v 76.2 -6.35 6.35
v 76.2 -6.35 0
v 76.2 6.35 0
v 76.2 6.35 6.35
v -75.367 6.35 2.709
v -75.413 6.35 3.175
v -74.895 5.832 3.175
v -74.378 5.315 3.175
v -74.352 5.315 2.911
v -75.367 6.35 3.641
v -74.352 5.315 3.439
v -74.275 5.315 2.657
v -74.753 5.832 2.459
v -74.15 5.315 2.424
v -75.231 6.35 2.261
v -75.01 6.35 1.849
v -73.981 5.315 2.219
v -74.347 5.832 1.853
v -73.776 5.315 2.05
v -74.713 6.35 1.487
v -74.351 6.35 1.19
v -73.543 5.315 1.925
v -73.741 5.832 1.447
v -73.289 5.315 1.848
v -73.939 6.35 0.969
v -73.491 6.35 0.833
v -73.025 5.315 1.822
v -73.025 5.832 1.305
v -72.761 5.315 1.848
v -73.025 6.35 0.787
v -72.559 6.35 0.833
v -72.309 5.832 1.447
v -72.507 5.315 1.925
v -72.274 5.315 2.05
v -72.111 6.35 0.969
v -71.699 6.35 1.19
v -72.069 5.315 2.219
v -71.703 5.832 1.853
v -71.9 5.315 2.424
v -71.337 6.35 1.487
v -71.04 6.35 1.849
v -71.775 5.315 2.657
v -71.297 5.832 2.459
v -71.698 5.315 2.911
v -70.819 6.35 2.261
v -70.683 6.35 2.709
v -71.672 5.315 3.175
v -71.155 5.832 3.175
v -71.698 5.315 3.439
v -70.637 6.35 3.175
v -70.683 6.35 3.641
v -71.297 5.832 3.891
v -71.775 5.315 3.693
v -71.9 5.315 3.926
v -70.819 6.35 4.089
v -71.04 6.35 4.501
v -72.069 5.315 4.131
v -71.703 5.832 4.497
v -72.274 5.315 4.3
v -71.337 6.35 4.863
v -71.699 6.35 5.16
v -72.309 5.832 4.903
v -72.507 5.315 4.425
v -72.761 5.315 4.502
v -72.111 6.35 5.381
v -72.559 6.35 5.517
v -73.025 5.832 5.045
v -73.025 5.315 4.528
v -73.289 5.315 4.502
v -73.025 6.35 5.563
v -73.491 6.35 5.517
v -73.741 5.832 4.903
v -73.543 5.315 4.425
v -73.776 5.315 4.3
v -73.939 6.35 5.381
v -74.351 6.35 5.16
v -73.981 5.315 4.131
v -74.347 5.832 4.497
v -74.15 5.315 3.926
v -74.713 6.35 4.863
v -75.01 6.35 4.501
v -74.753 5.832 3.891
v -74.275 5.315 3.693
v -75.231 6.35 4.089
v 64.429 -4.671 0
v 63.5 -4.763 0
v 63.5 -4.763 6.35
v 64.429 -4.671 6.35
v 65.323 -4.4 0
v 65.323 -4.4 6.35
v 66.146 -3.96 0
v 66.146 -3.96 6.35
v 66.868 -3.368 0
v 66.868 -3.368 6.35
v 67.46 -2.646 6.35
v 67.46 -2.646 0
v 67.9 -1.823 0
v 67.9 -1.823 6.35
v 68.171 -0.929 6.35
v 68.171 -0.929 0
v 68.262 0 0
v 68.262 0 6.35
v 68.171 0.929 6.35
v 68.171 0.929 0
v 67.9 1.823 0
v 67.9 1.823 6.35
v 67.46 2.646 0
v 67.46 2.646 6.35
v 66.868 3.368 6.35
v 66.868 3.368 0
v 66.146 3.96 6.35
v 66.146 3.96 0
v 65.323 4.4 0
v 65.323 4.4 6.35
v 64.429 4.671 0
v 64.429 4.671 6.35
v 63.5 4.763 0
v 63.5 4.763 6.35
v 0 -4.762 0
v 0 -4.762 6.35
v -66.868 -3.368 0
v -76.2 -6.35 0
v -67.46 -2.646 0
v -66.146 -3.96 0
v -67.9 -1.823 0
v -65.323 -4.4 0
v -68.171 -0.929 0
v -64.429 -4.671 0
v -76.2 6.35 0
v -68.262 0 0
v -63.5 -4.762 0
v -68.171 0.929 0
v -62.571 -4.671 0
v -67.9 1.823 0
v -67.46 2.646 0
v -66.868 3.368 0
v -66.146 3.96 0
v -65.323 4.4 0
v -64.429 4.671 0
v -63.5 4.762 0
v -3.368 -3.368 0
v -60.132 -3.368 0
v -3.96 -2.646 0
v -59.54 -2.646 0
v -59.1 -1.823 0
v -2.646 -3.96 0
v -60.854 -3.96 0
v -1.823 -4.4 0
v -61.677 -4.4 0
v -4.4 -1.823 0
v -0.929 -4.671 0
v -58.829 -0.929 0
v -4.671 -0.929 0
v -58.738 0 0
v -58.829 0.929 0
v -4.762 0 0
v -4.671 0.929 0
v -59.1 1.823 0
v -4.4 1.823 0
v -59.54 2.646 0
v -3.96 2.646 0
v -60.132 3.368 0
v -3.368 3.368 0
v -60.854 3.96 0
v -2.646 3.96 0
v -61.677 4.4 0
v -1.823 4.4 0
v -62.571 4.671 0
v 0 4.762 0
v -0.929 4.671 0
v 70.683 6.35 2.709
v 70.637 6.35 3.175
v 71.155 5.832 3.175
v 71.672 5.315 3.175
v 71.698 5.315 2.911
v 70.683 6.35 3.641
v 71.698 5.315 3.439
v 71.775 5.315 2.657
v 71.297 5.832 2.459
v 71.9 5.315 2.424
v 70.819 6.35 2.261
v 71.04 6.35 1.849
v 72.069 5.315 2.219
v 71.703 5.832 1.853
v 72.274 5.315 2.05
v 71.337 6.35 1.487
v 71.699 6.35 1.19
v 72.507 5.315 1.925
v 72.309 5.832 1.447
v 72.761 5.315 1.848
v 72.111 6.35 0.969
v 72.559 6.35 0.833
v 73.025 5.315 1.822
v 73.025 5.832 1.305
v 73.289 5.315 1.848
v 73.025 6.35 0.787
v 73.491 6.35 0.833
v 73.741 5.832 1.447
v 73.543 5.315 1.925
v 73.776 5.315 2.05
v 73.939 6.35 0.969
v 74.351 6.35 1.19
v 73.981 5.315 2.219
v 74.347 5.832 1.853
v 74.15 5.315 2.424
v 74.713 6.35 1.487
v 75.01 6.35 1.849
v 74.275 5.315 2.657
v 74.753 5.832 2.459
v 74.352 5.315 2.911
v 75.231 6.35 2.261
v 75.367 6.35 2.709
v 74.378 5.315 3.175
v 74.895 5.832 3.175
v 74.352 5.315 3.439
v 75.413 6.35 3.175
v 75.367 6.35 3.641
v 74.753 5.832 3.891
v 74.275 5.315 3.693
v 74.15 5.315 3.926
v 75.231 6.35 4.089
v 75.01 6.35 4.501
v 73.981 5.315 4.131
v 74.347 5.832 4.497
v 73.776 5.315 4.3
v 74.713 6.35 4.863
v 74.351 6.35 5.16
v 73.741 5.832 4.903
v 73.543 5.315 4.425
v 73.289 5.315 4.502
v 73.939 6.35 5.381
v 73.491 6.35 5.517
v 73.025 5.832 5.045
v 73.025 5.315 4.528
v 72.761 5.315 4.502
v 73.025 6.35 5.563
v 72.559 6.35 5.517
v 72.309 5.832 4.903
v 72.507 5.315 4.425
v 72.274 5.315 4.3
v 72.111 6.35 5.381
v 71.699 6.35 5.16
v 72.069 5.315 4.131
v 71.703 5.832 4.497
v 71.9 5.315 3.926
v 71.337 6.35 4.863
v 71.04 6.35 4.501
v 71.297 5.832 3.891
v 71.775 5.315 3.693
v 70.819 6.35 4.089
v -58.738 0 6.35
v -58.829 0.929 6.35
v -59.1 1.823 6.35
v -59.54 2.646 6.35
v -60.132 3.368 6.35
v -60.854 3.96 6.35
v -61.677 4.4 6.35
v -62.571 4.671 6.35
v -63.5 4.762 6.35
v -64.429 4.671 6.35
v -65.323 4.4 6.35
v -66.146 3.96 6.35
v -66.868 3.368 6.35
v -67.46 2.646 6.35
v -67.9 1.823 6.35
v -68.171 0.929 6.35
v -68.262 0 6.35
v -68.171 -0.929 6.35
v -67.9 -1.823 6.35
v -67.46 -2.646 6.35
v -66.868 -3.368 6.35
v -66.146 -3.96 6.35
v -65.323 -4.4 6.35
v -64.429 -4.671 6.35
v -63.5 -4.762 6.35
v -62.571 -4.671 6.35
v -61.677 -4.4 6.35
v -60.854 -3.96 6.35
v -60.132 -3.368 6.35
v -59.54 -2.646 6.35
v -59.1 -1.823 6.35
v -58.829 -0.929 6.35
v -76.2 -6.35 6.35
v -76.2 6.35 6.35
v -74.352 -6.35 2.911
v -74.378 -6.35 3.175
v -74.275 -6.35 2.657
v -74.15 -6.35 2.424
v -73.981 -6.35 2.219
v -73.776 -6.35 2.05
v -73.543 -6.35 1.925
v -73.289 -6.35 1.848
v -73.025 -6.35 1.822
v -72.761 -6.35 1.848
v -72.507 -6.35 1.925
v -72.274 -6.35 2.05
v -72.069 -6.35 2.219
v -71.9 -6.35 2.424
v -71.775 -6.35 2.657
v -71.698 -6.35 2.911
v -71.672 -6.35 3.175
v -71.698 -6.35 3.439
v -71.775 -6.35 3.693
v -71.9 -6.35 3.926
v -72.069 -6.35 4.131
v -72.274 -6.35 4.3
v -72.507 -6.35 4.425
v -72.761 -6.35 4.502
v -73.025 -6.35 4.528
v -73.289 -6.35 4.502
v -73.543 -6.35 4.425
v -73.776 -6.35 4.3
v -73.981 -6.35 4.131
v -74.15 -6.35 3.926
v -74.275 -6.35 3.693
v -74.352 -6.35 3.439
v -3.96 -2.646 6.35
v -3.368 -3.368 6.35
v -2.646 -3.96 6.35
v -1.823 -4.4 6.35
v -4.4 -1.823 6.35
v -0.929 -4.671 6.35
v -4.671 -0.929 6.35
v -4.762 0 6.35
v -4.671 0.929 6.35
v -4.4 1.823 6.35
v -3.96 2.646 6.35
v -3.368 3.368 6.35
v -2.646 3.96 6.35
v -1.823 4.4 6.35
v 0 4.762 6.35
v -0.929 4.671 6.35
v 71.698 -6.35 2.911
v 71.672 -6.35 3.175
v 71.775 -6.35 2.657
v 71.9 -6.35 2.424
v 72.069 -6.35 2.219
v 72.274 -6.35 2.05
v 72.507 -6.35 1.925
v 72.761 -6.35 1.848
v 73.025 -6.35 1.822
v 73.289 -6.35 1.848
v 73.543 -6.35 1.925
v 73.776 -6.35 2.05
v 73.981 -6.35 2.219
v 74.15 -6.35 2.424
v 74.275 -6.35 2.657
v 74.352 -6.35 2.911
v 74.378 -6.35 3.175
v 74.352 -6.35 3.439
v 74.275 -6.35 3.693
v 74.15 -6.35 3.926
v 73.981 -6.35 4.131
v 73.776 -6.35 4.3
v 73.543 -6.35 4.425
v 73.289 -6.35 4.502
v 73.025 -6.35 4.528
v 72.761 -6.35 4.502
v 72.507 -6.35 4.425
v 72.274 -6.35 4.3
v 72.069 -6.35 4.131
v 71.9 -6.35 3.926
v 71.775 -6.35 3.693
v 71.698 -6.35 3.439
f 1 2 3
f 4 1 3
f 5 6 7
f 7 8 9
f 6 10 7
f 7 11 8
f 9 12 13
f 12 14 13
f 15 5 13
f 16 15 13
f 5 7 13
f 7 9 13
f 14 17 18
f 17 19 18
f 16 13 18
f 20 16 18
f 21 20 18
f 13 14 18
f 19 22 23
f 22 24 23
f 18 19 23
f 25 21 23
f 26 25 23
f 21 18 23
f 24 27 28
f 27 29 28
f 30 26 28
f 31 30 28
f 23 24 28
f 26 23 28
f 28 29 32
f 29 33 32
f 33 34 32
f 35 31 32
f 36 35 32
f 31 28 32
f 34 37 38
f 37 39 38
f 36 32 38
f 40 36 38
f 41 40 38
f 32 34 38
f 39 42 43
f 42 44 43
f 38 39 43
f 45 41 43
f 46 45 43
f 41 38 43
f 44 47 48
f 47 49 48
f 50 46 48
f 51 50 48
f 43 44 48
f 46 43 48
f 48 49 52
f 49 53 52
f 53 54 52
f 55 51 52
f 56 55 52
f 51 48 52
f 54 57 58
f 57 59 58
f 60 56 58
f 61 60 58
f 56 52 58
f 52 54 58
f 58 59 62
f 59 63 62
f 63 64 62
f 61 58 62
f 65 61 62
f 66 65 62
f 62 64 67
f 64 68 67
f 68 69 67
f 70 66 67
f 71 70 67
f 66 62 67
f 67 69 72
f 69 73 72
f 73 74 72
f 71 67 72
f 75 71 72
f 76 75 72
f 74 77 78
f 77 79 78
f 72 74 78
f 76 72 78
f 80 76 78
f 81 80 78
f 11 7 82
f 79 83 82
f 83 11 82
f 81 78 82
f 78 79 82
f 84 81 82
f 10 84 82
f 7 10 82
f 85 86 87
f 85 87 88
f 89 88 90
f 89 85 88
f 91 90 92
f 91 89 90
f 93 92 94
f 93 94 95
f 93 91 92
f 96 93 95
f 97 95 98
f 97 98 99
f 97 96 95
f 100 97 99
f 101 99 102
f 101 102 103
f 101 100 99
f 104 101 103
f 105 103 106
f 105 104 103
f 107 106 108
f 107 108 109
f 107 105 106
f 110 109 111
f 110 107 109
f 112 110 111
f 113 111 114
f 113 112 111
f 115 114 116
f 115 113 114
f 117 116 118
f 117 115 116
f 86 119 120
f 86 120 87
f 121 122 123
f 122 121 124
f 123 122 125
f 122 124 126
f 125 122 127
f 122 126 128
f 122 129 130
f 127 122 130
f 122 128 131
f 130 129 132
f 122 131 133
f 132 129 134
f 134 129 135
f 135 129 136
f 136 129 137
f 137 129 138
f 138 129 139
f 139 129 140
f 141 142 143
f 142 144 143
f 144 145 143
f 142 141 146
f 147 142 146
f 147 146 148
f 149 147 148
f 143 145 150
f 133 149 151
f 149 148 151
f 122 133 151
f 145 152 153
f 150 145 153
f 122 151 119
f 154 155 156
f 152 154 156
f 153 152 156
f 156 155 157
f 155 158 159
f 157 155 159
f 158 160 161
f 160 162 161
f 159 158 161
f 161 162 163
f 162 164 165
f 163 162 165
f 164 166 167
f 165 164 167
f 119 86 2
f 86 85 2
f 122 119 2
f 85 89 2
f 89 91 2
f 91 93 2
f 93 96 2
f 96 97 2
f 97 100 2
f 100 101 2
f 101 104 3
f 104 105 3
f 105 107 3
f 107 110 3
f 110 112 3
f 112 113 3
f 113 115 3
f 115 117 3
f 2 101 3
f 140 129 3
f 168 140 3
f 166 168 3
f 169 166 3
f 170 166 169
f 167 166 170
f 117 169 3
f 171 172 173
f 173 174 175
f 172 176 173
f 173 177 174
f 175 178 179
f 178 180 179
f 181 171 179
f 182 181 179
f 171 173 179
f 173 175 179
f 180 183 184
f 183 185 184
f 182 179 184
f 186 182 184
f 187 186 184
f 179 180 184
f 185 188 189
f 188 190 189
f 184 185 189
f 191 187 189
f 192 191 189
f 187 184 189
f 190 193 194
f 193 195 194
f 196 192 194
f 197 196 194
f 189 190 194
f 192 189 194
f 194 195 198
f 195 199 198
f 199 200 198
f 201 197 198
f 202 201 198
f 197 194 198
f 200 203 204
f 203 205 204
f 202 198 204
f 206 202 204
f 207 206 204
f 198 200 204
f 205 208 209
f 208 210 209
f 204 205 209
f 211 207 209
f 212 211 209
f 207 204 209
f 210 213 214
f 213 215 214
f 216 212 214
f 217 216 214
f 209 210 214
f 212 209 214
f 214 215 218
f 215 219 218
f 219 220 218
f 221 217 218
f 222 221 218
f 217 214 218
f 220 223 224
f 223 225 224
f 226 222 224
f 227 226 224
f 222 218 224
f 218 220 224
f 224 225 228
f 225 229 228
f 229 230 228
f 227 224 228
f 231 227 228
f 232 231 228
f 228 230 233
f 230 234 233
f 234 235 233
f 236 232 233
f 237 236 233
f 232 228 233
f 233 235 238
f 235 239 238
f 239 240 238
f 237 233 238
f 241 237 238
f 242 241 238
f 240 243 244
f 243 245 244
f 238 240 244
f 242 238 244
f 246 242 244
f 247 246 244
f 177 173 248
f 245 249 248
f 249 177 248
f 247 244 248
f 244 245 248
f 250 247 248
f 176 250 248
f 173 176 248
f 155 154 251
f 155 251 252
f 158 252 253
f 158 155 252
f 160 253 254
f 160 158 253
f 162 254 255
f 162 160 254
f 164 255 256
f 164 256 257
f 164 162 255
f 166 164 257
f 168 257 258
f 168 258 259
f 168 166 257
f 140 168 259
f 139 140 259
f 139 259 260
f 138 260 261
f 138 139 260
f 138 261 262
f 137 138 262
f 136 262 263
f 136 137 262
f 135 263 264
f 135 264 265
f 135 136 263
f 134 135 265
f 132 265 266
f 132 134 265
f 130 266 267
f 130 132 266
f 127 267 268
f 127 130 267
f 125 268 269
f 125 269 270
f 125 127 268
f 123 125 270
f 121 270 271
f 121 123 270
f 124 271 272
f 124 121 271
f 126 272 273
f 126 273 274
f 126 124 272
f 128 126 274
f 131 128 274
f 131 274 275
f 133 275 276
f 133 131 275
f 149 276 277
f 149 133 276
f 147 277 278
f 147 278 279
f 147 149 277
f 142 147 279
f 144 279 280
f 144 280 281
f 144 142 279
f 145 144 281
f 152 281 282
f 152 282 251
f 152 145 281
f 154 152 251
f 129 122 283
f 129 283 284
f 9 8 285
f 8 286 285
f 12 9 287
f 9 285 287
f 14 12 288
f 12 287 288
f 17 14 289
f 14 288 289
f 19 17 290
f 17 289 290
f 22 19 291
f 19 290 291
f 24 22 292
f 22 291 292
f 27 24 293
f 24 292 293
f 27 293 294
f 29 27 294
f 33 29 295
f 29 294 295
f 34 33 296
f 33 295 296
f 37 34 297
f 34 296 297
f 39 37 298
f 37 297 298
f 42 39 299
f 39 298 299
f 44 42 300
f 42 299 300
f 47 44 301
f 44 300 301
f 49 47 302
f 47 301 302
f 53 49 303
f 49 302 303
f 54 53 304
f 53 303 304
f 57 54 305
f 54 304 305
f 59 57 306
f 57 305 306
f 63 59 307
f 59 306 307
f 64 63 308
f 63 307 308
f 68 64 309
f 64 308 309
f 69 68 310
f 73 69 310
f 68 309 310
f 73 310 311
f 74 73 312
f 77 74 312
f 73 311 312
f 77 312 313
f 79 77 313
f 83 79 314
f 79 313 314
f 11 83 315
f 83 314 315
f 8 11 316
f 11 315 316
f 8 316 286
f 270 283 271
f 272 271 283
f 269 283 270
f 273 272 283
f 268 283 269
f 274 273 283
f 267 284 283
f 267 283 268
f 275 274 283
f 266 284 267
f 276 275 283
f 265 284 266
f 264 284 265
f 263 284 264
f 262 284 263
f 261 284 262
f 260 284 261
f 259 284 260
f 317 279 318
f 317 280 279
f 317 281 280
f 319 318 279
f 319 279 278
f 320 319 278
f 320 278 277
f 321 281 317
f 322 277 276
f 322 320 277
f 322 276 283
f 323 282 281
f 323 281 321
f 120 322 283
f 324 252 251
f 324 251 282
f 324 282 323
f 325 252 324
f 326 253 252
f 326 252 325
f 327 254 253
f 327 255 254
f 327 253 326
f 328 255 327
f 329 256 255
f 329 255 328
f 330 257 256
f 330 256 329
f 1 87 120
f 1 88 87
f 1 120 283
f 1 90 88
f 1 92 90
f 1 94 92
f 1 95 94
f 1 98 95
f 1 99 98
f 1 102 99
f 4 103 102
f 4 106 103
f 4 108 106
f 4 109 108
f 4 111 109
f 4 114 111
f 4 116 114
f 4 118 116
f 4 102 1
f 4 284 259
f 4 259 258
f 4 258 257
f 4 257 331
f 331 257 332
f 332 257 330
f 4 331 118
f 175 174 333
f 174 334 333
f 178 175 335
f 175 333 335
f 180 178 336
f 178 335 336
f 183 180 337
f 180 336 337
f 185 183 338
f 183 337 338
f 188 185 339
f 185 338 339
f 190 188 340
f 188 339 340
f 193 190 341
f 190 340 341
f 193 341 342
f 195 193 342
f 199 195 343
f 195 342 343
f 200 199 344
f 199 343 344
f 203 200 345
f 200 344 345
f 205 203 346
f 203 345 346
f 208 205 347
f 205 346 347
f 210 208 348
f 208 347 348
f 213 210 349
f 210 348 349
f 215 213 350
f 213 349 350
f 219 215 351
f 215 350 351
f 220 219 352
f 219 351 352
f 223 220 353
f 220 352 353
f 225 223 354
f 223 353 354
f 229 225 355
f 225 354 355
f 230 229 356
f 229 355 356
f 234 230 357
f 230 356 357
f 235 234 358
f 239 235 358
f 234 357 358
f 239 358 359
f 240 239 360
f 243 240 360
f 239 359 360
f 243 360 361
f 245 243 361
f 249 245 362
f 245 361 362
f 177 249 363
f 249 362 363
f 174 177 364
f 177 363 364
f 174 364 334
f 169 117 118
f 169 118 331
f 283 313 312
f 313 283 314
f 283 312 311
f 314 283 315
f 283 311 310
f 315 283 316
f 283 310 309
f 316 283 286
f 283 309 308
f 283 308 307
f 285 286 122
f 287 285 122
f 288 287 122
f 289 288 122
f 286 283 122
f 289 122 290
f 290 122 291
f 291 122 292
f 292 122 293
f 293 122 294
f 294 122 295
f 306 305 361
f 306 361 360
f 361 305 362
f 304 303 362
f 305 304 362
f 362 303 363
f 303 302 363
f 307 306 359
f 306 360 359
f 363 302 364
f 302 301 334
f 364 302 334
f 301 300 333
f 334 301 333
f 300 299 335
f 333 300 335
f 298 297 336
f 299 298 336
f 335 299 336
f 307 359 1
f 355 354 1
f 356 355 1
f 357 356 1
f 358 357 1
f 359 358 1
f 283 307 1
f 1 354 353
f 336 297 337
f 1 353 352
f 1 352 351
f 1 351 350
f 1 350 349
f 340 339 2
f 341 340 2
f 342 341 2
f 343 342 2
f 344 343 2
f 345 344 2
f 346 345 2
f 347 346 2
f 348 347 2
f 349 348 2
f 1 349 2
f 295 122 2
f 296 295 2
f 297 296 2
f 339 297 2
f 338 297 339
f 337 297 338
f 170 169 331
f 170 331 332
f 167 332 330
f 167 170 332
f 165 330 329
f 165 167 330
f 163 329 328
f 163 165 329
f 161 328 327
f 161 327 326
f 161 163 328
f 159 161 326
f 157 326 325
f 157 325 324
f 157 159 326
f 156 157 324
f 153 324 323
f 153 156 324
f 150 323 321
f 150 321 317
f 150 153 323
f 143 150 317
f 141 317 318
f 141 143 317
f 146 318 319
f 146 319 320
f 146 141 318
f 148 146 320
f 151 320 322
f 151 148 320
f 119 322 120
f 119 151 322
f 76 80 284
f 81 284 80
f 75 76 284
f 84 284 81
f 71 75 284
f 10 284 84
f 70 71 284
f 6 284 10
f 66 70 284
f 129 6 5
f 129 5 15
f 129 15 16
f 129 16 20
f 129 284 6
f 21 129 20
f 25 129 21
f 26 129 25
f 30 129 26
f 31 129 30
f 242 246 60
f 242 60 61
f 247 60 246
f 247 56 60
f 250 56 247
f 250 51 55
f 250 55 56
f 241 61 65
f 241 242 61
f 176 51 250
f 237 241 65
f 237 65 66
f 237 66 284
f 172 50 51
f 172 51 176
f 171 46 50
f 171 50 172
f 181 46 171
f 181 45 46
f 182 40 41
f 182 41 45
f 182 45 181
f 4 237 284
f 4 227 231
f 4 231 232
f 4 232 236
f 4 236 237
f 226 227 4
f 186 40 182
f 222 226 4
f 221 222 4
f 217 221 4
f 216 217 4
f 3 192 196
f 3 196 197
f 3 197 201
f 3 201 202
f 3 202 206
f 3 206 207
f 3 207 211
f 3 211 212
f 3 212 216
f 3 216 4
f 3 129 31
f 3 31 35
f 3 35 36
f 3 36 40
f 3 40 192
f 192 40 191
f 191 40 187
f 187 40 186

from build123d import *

# Parameters (mm, degrees)
SKETCH2_W                       = 152.4
SKETCH2_H                       = 12.7
SKETCH2_R                       = 4.7625
BOSS_EXTRUDE1_DEPTH             = 6.35
F_6_32_TAPPED_HOLE1_D           = 2.7051
F_6_32_TAPPED_HOLE1_CSINK_D     = 4.7752
F_6_32_TAPPED_HOLE1_CSINK_ANGLE = 90
F_6_32_TAPPED_HOLE2_D           = 2.7051
F_6_32_TAPPED_HOLE2_CSINK_D     = 4.7752
F_6_32_TAPPED_HOLE2_CSINK_ANGLE = 90


with BuildPart() as part:
    # Sketch2 → Boss-Extrude1 (new body)
    with BuildSketch(Plane.XY):
        Rectangle(SKETCH2_W, SKETCH2_H)
        with Locations((-63.5, 0)):
            Circle(SKETCH2_R, mode=Mode.SUBTRACT)
        with BuildLine():
            Line((0, -4.7625), (63.5, -4.7625))
            ThreePointArc((63.5, -4.7625), (68.2625, 0), (63.5, 4.7625))
            Line((63.5, 4.7625), (0, 4.7625))
            ThreePointArc((0, 4.7625), (-4.7625, 0), (0, -4.7625))
        make_face(mode=Mode.SUBTRACT)
    extrude(amount=BOSS_EXTRUDE1_DEPTH)

    # #6-32 Tapped Hole1 (through all)
    with Locations(Plane(origin=(0, 6.35, 0), x_dir=(1, 0, 0), z_dir=(0, 1, 0))):
        with Locations((-73.025, -3.175)):
            CounterSinkHole(F_6_32_TAPPED_HOLE1_D / 2, F_6_32_TAPPED_HOLE1_CSINK_D / 2, counter_sink_angle=F_6_32_TAPPED_HOLE1_CSINK_ANGLE)

    # #6-32 Tapped Hole2 (through all)
    with Locations(Plane(origin=(0, 6.35, 0), x_dir=(1, 0, 0), z_dir=(0, 1, 0))):
        with Locations((73.025, -3.175)):
            CounterSinkHole(F_6_32_TAPPED_HOLE2_D / 2, F_6_32_TAPPED_HOLE2_CSINK_D / 2, counter_sink_angle=F_6_32_TAPPED_HOLE2_CSINK_ANGLE)


solid = part.part
